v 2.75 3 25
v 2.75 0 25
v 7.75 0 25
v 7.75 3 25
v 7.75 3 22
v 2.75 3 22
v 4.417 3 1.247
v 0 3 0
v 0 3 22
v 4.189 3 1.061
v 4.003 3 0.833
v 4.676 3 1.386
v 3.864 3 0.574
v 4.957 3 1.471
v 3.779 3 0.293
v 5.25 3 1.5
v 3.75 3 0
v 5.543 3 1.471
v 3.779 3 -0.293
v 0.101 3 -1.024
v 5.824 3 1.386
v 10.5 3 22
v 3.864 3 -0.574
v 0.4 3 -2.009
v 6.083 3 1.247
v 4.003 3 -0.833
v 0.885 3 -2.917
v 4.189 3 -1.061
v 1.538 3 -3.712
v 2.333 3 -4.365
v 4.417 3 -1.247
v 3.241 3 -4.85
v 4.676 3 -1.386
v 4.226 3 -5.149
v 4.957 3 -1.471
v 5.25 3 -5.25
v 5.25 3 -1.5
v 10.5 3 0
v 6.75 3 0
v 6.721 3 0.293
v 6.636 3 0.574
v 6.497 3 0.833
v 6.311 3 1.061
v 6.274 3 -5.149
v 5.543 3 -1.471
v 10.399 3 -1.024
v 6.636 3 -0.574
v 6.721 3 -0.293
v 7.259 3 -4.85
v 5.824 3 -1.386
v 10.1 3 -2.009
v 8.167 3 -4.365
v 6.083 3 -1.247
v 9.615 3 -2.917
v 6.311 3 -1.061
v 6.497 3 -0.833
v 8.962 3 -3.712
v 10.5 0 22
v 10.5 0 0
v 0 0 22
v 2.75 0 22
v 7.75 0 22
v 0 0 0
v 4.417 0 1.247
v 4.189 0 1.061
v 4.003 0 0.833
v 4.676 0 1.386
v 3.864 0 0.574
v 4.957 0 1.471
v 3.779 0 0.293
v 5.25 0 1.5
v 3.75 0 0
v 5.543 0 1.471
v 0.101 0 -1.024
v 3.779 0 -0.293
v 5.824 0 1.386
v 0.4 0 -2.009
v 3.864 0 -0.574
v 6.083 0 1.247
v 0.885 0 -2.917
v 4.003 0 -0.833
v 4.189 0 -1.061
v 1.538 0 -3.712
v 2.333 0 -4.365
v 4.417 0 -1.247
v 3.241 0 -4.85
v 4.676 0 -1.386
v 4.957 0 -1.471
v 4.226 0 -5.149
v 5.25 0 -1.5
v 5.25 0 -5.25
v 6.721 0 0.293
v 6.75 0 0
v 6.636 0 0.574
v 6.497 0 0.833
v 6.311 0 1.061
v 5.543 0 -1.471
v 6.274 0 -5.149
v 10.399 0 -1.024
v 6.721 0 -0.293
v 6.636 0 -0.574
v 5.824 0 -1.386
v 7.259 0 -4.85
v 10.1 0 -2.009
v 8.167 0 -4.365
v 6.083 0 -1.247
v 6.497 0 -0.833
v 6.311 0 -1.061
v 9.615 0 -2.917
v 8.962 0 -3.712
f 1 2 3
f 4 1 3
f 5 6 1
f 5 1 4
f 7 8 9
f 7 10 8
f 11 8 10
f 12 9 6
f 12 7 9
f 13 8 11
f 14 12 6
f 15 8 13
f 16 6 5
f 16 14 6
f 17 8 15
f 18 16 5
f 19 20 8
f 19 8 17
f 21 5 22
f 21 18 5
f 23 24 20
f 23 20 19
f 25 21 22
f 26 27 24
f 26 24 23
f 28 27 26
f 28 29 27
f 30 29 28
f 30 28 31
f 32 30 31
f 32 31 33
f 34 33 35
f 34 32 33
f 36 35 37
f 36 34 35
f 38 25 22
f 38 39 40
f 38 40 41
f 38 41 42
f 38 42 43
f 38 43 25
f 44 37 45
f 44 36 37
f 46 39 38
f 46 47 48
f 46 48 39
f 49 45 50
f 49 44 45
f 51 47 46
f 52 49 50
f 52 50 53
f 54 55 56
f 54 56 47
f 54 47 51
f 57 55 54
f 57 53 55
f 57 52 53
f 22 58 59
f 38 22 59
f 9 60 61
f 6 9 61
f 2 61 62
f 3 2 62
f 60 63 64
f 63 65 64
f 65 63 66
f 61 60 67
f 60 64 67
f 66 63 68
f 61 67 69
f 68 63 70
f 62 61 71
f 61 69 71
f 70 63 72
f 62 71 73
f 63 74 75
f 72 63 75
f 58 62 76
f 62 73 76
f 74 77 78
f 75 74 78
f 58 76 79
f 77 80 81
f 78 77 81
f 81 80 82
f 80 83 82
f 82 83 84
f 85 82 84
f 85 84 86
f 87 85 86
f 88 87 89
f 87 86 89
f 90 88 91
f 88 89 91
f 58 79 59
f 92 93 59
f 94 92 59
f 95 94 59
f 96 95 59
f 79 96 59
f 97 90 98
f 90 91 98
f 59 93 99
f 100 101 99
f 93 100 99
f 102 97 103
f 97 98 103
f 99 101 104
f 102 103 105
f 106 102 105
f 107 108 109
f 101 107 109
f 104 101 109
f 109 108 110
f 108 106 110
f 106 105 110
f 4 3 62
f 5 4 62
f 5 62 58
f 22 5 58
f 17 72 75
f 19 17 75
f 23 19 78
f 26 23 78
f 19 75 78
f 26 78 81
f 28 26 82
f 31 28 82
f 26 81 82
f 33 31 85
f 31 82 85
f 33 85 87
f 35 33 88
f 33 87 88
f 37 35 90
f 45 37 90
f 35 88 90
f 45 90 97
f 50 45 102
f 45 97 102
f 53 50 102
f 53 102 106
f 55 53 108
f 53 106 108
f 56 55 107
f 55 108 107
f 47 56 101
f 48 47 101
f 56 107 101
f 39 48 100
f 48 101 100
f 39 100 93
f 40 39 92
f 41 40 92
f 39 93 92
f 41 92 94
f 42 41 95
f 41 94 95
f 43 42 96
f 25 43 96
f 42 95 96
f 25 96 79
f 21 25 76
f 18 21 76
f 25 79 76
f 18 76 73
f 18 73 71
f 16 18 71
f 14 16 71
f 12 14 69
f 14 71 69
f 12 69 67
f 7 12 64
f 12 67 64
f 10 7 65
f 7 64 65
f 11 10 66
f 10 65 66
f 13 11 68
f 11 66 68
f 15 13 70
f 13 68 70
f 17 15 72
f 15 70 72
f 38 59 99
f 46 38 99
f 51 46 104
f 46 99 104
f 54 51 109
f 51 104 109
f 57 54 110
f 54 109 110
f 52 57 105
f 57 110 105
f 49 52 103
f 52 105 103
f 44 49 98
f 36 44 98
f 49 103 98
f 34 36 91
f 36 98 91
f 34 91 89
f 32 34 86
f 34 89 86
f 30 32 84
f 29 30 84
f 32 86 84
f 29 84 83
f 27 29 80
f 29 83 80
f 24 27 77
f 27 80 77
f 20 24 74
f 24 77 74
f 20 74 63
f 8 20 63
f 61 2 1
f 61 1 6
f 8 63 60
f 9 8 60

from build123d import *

# Parameters (mm, degrees)
SKETCH_1_W      = 5
SKETCH_1_H      = 3
EXTRUDE_1_DEPTH = 3


with BuildPart() as part:
    # 草图1 → 凸台-拉伸1 (new body)
    with BuildSketch(Plane(origin=(0, 0, 0), x_dir=(1, 0, 0), z_dir=(0, 1, 0))):
        with BuildLine():
            Line((10.5, -22), (10.5, 0))
            ThreePointArc((10.5, 0), (5.25, -5.25), (0, 0))
            Line((0, 0), (0, -22))
            Line((0, -22), (2.75, -22))
            Line((2.75, -22), (7.75, -22))
            Line((7.75, -22), (10.5, -22))
        make_face()
        with Locations((5.25, -23.5)):
            Rectangle(SKETCH_1_W, SKETCH_1_H)
        with BuildLine():
            ThreePointArc((3.75, 0), (5.25, 1.5), (6.75, 0))
            Line((6.75, 0), (10.5, 0))
            ThreePointArc((10.5, 0), (5.25, 5.25), (0, 0))
            Line((0, 0), (3.75, 0))
        make_face()
        with BuildLine():
            Line((10.5, 0), (6.75, 0))
            ThreePointArc((6.75, 0), (5.25, -1.5), (3.75, 0))
            Line((3.75, 0), (0, 0))
            ThreePointArc((0, 0), (5.25, -5.25), (10.5, 0))
        make_face()
    extrude(amount=EXTRUDE_1_DEPTH)


solid = part.part
